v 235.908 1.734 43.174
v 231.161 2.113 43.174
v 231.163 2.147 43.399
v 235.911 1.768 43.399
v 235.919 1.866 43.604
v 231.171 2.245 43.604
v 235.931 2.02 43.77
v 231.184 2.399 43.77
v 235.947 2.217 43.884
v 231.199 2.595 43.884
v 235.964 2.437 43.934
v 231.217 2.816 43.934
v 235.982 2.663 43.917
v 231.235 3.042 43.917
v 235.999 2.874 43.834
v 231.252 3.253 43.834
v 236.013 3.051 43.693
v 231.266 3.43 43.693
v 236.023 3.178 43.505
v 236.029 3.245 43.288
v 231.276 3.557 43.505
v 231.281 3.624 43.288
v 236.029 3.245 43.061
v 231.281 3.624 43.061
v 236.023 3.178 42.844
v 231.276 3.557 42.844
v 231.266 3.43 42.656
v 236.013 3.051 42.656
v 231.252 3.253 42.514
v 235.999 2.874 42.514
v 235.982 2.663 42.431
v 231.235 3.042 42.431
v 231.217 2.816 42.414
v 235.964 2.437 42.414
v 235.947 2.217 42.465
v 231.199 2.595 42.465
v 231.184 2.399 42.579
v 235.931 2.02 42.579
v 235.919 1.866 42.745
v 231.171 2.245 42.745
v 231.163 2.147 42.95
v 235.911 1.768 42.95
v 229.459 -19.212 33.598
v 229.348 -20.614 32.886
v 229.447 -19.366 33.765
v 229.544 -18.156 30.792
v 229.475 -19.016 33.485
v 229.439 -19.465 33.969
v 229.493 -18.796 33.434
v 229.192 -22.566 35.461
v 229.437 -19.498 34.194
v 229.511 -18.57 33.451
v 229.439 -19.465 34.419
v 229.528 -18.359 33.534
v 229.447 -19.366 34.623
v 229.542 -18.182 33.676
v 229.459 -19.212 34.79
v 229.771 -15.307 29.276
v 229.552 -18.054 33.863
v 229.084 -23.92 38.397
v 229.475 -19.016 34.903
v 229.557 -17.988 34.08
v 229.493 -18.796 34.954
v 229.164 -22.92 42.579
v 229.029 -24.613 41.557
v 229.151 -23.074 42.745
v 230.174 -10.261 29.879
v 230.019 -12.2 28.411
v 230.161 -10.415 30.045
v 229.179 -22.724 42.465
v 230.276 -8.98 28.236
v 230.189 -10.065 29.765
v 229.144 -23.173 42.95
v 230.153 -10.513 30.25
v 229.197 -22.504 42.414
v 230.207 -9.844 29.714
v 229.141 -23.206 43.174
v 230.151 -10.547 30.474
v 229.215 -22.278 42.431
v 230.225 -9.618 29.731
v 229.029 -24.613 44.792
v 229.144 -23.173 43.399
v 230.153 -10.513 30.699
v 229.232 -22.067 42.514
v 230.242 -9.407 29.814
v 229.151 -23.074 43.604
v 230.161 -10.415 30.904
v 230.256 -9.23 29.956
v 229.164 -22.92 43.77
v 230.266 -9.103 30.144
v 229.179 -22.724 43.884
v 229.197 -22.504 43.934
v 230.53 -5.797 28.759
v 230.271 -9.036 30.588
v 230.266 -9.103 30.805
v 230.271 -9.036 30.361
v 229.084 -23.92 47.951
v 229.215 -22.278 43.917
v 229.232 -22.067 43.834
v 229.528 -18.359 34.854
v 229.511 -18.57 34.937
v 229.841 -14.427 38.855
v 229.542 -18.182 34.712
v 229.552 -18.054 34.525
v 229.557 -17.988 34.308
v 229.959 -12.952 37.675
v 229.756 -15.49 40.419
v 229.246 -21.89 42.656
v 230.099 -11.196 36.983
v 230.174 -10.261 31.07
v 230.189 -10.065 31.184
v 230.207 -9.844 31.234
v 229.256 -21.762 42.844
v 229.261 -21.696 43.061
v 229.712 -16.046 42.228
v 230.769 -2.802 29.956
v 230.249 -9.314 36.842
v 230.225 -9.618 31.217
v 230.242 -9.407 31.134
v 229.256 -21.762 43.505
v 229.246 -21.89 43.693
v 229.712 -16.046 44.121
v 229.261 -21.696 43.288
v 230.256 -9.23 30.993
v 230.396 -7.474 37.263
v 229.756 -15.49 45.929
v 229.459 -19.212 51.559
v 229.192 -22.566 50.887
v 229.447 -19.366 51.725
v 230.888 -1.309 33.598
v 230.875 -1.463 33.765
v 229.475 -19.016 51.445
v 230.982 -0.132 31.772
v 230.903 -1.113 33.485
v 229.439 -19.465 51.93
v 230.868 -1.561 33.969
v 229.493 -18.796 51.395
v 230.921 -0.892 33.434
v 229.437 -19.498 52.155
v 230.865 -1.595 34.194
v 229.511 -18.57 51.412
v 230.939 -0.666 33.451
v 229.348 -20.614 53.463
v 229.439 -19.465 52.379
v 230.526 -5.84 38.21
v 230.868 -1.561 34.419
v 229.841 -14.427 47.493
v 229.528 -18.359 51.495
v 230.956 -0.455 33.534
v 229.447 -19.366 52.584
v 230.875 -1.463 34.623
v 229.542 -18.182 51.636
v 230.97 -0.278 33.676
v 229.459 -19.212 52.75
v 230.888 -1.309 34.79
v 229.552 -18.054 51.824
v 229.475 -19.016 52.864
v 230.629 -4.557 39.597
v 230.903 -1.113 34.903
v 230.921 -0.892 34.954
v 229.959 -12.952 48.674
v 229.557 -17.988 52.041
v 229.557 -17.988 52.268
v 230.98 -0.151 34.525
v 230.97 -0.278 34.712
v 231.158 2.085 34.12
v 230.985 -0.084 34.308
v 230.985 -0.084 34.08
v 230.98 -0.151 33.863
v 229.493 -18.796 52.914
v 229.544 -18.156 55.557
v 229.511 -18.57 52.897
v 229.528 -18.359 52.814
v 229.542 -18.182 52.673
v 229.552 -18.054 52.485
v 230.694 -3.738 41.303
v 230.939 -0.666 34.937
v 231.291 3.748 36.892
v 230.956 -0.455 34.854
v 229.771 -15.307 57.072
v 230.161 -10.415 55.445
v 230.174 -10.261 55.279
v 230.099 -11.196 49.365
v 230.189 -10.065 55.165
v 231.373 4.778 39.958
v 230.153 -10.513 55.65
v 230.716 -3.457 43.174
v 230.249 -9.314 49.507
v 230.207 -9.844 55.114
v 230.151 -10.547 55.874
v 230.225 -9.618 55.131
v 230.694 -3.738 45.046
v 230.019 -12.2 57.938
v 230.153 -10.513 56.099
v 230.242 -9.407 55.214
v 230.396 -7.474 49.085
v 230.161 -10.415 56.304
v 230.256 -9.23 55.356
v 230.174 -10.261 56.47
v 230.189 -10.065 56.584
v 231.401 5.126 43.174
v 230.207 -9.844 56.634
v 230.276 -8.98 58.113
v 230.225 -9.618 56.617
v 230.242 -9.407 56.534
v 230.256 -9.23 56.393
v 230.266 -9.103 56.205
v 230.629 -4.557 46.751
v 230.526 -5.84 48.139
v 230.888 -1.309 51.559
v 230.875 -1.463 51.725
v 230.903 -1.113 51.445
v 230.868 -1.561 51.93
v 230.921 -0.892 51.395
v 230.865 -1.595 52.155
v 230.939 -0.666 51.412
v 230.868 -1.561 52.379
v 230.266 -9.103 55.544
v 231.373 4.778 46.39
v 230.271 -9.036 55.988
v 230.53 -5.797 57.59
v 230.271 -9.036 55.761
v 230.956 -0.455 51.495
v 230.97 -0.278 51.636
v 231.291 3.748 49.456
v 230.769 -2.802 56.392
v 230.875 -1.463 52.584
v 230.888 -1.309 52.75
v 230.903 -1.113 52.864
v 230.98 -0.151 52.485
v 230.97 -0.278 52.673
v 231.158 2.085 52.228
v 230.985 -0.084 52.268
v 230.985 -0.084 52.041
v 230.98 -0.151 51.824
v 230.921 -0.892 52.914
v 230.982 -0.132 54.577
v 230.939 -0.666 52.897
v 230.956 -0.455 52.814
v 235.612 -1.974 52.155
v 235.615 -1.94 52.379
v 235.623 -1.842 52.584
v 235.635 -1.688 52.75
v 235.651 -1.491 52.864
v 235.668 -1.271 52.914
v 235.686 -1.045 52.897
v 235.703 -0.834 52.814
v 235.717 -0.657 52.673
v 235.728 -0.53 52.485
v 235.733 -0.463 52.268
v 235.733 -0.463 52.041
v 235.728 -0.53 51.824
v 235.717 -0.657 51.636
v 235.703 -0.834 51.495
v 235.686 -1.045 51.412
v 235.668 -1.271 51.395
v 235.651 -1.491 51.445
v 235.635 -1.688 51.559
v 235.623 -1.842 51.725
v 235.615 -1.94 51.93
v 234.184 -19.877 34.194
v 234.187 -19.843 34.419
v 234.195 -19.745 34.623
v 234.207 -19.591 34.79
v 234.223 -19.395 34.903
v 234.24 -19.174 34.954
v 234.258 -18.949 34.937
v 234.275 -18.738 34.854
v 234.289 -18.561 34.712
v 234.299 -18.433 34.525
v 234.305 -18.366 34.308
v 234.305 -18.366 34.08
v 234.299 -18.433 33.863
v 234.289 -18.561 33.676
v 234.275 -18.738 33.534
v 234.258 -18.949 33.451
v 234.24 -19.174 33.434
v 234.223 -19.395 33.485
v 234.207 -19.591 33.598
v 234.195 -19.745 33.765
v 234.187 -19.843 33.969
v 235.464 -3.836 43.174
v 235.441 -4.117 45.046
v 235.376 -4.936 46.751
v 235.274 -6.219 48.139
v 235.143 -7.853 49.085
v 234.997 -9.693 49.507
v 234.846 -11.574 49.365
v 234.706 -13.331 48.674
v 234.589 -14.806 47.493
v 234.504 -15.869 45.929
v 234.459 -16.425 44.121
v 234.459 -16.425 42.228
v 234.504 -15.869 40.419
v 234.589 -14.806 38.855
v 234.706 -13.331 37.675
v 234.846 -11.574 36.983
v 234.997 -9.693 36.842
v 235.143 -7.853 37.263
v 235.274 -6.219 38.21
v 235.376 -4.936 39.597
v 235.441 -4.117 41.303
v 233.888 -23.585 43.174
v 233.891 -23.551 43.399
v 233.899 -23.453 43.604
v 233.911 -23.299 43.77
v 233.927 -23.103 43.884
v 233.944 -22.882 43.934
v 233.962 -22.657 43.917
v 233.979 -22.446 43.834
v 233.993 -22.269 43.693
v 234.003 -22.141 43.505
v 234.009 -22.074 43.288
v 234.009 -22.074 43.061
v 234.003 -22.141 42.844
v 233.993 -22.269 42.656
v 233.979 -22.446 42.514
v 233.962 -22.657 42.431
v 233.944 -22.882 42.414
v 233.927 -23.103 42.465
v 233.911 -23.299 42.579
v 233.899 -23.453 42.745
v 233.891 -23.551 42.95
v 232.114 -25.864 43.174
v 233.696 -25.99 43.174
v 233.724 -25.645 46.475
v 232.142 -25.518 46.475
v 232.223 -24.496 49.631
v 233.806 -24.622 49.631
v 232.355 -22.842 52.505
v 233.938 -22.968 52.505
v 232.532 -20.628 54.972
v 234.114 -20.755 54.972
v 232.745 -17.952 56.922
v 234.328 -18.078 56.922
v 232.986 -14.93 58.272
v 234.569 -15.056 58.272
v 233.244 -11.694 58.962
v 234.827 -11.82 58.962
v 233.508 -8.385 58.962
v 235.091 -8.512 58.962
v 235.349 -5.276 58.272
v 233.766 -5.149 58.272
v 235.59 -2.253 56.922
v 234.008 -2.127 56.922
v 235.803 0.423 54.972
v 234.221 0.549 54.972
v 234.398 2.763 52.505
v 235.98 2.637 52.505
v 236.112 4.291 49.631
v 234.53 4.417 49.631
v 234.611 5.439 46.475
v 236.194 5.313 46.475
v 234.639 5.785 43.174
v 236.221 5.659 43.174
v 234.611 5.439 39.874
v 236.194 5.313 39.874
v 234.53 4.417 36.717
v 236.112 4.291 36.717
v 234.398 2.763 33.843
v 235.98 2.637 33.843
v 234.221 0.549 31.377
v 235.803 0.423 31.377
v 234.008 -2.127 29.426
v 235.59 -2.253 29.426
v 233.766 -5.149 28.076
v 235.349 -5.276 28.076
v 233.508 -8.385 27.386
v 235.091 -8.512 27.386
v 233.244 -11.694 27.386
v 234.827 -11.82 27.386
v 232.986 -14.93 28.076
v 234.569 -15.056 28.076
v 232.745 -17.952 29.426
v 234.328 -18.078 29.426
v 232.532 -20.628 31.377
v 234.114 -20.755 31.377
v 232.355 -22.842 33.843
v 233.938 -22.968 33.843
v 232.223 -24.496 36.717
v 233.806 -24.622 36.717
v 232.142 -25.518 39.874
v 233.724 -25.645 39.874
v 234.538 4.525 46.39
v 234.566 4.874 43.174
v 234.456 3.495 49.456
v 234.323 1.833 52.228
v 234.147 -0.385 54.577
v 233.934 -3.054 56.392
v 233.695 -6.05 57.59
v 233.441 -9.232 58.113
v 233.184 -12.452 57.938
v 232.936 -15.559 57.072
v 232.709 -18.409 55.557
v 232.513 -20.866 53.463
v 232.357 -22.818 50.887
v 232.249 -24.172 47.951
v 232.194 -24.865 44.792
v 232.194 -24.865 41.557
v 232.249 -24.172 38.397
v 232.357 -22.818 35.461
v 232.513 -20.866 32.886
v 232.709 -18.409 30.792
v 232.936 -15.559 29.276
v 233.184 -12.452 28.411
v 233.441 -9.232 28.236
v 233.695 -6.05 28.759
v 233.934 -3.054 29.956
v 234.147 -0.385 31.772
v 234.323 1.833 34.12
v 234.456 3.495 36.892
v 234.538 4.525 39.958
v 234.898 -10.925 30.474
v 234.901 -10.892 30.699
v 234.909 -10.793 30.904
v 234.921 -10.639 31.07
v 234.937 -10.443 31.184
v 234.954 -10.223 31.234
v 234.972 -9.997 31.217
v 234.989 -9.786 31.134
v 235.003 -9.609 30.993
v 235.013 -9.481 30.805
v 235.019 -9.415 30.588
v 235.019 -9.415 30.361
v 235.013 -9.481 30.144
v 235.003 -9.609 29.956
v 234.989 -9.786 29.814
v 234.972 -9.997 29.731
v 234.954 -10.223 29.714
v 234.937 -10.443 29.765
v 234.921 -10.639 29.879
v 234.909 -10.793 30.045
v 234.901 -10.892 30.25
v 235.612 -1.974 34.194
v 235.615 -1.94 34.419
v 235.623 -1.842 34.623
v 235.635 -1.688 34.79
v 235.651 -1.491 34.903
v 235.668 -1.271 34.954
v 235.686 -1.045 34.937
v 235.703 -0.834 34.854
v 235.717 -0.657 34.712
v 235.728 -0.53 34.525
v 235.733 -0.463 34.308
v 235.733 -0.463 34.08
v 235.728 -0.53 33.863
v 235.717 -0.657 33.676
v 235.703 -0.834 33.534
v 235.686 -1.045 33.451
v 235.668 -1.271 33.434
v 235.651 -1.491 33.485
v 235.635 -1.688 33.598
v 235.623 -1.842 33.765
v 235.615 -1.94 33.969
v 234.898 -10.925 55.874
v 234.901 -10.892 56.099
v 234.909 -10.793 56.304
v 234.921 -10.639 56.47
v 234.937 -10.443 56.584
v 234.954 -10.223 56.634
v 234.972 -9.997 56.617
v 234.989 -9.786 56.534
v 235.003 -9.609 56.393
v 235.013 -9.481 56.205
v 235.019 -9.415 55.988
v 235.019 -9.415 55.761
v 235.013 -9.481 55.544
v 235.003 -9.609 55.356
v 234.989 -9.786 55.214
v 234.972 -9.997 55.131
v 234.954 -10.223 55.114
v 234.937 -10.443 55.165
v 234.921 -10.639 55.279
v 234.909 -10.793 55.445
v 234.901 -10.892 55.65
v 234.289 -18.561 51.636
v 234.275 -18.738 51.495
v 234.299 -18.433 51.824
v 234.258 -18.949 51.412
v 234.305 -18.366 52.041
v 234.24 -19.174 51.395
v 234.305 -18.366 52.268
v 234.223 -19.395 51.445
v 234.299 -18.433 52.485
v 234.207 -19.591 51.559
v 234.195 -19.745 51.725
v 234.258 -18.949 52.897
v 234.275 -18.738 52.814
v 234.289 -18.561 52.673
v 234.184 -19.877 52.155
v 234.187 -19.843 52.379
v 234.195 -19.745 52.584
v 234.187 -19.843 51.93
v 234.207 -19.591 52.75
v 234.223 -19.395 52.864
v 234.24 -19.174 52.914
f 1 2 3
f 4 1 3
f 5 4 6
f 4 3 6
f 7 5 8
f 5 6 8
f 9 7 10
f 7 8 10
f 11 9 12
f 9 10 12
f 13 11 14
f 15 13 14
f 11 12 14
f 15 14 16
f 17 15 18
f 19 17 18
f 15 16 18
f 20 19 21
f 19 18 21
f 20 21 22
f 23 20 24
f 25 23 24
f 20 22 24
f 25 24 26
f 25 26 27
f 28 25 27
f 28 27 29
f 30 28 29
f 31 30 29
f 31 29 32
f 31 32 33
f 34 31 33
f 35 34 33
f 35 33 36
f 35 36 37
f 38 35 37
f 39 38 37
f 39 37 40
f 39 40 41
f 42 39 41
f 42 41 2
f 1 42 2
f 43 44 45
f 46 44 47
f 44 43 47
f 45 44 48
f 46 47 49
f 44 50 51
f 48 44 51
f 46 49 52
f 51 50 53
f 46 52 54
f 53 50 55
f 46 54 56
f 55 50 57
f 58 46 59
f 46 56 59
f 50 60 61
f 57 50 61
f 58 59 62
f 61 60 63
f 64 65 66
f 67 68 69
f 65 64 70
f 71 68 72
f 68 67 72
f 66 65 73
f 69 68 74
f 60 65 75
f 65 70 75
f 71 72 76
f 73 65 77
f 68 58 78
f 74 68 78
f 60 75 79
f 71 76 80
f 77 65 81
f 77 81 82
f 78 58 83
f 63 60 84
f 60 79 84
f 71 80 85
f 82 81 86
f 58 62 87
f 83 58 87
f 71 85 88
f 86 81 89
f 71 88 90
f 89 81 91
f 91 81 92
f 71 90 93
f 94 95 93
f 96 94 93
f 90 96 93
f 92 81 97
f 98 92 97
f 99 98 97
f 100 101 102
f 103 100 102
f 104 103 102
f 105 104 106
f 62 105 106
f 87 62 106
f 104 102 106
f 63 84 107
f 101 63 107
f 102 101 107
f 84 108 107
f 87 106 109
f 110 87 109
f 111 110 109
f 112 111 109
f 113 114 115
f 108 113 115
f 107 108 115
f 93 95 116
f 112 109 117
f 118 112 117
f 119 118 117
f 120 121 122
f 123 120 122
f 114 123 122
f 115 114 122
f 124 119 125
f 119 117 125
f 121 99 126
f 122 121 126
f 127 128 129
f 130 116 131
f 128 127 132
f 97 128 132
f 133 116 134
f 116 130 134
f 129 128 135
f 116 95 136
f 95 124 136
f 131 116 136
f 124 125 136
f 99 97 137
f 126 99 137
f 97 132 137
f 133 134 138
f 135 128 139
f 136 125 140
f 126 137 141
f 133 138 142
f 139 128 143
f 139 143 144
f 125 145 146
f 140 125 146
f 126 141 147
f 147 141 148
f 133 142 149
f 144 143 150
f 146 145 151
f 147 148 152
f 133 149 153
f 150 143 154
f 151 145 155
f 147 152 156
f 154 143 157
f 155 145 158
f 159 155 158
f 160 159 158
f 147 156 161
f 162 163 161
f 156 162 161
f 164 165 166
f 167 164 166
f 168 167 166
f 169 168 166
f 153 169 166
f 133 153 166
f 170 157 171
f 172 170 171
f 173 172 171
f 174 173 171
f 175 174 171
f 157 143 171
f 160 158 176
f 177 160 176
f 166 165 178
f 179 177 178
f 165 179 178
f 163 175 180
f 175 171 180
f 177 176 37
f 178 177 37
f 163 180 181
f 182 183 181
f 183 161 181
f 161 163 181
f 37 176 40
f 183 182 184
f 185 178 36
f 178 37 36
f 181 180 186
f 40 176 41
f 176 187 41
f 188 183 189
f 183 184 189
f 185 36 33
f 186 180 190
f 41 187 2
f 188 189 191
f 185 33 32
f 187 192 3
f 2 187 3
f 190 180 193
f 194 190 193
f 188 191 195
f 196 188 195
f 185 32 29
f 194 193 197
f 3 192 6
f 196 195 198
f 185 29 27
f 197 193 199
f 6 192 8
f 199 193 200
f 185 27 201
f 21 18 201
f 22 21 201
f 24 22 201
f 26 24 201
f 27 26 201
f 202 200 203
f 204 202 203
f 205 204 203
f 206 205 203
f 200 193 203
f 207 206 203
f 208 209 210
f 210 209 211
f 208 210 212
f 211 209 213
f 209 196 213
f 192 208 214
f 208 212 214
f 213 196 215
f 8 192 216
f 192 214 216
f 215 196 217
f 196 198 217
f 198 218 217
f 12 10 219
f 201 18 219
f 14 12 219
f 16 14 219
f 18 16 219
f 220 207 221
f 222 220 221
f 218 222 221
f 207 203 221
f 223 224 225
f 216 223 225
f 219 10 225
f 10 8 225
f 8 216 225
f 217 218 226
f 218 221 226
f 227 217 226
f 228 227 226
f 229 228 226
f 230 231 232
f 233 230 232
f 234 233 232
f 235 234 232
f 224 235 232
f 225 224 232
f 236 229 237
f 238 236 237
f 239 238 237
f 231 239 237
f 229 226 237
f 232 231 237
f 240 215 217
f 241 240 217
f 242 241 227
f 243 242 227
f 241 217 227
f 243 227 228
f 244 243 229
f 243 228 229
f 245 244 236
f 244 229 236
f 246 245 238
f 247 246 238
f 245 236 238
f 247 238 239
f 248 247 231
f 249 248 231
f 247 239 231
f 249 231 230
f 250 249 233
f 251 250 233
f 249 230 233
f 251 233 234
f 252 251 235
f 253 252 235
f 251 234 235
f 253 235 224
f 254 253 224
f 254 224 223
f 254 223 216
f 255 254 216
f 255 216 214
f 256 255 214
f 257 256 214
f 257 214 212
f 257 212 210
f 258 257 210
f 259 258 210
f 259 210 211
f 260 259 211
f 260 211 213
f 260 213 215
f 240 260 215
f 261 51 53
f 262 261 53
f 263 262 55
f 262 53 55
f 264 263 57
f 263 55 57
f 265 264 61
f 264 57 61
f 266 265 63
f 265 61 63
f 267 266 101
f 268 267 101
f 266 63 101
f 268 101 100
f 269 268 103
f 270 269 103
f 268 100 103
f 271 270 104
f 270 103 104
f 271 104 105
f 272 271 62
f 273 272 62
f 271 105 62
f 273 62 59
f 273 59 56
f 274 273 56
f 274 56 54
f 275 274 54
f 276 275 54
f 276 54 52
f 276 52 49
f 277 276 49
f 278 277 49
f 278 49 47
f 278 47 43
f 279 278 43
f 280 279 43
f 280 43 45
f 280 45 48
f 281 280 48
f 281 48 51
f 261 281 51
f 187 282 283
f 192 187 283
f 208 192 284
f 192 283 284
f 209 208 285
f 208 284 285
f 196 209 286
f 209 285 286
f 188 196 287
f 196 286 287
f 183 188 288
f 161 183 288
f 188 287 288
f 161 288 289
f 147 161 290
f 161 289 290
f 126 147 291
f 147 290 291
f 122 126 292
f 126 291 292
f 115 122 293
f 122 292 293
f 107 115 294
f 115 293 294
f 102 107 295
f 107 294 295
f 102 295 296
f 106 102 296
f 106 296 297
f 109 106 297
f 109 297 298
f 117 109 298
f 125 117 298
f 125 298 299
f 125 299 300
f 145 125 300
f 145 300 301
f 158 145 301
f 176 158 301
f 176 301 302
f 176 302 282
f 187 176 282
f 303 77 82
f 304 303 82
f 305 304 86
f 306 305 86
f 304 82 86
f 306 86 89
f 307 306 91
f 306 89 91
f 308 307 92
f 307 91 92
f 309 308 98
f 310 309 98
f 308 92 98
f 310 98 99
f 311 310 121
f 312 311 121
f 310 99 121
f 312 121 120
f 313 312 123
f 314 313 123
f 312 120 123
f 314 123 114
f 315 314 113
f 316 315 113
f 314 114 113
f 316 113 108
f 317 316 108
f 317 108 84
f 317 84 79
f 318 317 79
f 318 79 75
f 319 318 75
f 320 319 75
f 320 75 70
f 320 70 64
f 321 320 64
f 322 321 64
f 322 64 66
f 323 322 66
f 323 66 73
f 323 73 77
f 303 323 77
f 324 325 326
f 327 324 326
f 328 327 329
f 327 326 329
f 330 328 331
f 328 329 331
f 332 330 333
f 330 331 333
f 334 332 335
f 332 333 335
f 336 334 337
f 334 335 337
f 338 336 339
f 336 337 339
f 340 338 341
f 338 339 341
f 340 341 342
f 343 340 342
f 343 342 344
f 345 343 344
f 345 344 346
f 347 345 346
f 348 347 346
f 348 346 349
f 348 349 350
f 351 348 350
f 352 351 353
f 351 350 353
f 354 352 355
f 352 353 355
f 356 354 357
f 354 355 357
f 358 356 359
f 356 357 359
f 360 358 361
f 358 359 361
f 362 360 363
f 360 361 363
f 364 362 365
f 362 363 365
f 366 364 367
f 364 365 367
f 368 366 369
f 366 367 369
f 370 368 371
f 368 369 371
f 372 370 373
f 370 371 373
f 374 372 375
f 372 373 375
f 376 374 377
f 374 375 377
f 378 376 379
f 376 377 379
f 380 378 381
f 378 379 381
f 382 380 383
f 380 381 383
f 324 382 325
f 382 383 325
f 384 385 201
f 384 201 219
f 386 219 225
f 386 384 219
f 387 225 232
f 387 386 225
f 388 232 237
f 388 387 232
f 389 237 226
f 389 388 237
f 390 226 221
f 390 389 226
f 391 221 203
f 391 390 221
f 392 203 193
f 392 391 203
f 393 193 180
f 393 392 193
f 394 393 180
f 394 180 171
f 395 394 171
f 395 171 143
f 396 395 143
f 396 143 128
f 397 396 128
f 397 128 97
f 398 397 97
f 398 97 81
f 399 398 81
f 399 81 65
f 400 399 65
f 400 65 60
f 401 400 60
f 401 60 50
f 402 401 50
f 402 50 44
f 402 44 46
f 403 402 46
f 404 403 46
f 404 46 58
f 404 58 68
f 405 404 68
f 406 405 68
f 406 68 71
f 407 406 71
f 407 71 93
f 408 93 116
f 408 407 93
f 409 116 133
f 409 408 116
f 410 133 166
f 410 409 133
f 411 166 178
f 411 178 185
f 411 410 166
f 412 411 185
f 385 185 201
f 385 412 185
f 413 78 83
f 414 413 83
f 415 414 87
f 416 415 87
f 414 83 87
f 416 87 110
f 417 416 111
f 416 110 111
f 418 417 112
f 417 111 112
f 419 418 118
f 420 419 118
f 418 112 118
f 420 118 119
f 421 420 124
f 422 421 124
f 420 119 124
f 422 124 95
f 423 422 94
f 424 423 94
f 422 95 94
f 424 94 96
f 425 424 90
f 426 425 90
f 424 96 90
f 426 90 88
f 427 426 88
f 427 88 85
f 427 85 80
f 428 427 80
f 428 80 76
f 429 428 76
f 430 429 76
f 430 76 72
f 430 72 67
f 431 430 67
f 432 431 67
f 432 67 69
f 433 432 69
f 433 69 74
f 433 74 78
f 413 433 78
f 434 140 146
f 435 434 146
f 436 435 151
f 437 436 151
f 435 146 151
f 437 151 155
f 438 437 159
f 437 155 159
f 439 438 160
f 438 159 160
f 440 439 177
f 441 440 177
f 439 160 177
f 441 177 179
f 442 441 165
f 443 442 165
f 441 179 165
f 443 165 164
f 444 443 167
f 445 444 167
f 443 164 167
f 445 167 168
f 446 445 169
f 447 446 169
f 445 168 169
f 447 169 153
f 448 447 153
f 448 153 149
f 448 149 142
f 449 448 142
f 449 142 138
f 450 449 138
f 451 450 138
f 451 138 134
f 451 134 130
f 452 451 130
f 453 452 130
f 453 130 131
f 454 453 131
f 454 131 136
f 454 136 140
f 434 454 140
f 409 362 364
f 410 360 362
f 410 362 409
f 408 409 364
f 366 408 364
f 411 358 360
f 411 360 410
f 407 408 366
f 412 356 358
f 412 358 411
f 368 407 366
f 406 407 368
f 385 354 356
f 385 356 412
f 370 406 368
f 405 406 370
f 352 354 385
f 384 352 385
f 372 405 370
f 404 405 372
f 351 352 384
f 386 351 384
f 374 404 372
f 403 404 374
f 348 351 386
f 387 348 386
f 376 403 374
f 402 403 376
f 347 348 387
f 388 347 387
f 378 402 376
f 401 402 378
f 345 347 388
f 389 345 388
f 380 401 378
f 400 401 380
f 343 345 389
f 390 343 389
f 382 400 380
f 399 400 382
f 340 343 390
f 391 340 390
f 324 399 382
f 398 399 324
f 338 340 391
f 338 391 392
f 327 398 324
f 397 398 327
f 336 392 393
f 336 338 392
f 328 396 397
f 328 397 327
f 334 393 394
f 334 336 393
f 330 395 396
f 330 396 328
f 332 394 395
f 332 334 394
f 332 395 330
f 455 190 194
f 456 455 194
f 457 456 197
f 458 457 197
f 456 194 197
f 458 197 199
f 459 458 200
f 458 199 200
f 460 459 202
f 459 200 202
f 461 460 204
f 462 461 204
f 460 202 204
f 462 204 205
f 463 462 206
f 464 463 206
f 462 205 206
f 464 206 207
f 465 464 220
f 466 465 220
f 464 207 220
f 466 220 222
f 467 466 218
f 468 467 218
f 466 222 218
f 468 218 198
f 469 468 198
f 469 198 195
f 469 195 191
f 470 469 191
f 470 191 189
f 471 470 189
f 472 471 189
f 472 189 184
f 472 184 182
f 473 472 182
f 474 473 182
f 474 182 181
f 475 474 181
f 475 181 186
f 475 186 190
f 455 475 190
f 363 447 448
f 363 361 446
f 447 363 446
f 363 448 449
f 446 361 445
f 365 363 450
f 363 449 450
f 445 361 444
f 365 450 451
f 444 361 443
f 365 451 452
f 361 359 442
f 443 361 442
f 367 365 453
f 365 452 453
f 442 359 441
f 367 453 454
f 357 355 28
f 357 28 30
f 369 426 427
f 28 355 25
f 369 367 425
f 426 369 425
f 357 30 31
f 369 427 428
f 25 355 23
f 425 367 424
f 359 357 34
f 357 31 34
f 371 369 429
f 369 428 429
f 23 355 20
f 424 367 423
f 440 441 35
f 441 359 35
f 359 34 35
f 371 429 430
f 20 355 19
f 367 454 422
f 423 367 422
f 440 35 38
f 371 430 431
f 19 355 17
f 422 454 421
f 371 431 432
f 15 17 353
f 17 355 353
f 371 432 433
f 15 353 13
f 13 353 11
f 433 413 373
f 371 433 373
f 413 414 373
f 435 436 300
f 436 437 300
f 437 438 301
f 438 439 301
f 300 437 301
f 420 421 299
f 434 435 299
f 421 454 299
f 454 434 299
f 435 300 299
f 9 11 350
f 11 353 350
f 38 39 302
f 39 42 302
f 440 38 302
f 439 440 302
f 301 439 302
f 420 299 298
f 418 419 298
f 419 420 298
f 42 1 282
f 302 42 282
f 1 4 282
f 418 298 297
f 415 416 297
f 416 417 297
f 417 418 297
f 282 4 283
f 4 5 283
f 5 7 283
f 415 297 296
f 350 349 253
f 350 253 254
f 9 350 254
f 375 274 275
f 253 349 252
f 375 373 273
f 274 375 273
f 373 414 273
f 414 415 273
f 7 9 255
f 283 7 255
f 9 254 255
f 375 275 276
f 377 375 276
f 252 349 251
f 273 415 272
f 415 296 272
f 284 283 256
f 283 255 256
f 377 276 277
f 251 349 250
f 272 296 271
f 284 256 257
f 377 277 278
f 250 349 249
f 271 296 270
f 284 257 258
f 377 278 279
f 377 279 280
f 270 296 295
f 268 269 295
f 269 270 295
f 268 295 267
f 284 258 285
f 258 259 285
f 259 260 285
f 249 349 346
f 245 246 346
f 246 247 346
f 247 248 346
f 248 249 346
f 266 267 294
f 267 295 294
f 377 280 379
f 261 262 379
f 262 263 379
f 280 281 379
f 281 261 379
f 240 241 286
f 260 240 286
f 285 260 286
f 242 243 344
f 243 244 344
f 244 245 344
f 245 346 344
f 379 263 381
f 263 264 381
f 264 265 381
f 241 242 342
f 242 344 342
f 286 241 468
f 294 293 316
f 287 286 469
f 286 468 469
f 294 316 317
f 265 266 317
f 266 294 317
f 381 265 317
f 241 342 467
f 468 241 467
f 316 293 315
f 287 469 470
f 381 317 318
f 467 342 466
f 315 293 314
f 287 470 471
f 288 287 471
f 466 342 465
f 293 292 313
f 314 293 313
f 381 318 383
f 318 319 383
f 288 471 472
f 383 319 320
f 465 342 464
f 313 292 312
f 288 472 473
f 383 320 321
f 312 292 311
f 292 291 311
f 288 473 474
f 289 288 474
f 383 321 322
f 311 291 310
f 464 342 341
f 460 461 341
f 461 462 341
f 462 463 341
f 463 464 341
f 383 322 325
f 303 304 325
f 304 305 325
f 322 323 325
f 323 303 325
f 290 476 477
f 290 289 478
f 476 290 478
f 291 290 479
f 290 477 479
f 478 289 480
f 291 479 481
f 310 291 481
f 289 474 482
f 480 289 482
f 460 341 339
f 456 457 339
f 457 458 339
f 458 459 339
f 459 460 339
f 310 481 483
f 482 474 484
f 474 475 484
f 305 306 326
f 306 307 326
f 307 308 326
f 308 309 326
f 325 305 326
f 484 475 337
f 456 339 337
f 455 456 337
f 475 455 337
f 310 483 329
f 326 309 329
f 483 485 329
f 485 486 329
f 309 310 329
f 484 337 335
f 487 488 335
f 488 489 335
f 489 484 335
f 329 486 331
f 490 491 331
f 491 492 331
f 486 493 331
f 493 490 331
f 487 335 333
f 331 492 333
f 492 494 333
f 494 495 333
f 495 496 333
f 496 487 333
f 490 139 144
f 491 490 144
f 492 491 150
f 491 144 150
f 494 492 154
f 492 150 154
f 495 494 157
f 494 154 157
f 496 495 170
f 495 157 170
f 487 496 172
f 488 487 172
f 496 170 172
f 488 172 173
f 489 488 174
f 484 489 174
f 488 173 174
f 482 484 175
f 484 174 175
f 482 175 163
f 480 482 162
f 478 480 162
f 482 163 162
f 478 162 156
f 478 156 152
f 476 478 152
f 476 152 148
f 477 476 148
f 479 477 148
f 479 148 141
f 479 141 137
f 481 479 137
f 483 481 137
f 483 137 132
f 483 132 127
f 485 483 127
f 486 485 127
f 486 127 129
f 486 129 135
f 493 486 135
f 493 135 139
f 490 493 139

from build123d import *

# Parameters (mm, degrees)
SKETCH1_R           = 14.9606
BOSS_EXTRUDE1_DEPTH = 4.7625
SKETCH2_R           = 6.35
CUT_EXTRUDE1_DEPTH  = 6.35
SKETCH3_R           = 0.762
CUT_EXTRUDE2_DEPTH  = 10
SKETCH5_R           = 15.875
SKETCH5_R_2         = 14.9606
BOSS_EXTRUDE2_DEPTH = 1.5875


with BuildPart() as part:
    # Sketch1 → Boss-Extrude1 (new body)
    with BuildSketch(Plane(origin=(234.278878836, -18.689027227, 0), x_dir=(0, 0, -1), z_dir=(0.9968332748770866, -0.0795199477981641, 0))):
        with Locations((-43.174261814, 8.550344032)):
            Circle(SKETCH1_R)
    extrude(amount=-BOSS_EXTRUDE1_DEPTH)

    # Sketch2 → Cut-Extrude1 (cut)
    with BuildSketch(Plane(origin=(234.278878836, -18.689027227, 0), x_dir=(0, 0, -1), z_dir=(0.9968332748770866, -0.07951994779816411, 0))):
        with Locations((-43.174261814, 8.550344032)):
            Circle(SKETCH2_R)
    extrude(amount=-CUT_EXTRUDE1_DEPTH, mode=Mode.SUBTRACT)

    # Sketch3 → Cut-Extrude2 (cut)
    with BuildSketch(Plane(origin=(229.531460364, -18.310313476, 0), x_dir=(0, 0, 1), z_dir=(-0.9968332748770866, 0.07951994779816411, 0))):
        with Locations((43.174261814, 21.250344032)):
            Circle(SKETCH3_R)
        with Locations((52.154517935, 17.530600153)):
            Circle(SKETCH3_R)
        with Locations((55.874261814, 8.550344032)):
            Circle(SKETCH3_R)
        with Locations((52.154517935, -0.429912089)):
            Circle(SKETCH3_R)
        with Locations((43.174261814, -4.149655968)):
            Circle(SKETCH3_R)
        with Locations((34.194005693, -0.429912089)):
            Circle(SKETCH3_R)
        with Locations((30.474261814, 8.550344032)):
            Circle(SKETCH3_R)
        with Locations((34.194005693, 17.530600153)):
            Circle(SKETCH3_R)
    extrude(amount=-CUT_EXTRUDE2_DEPTH, mode=Mode.SUBTRACT)

    # Sketch5 → Boss-Extrude2 (add)
    with BuildSketch(Plane(origin=(234.278878836, -18.689027227, 0), x_dir=(0, 0, 1), z_dir=(-0.9968332748770866, 0.07951994779816411, 0))):
        with Locations((43.174261814, 8.550344032)):
            Circle(SKETCH5_R)
        with Locations((43.174261814, 8.550344032)):
            Circle(SKETCH5_R_2, mode=Mode.SUBTRACT)
    extrude(amount=BOSS_EXTRUDE2_DEPTH)


solid = part.part
